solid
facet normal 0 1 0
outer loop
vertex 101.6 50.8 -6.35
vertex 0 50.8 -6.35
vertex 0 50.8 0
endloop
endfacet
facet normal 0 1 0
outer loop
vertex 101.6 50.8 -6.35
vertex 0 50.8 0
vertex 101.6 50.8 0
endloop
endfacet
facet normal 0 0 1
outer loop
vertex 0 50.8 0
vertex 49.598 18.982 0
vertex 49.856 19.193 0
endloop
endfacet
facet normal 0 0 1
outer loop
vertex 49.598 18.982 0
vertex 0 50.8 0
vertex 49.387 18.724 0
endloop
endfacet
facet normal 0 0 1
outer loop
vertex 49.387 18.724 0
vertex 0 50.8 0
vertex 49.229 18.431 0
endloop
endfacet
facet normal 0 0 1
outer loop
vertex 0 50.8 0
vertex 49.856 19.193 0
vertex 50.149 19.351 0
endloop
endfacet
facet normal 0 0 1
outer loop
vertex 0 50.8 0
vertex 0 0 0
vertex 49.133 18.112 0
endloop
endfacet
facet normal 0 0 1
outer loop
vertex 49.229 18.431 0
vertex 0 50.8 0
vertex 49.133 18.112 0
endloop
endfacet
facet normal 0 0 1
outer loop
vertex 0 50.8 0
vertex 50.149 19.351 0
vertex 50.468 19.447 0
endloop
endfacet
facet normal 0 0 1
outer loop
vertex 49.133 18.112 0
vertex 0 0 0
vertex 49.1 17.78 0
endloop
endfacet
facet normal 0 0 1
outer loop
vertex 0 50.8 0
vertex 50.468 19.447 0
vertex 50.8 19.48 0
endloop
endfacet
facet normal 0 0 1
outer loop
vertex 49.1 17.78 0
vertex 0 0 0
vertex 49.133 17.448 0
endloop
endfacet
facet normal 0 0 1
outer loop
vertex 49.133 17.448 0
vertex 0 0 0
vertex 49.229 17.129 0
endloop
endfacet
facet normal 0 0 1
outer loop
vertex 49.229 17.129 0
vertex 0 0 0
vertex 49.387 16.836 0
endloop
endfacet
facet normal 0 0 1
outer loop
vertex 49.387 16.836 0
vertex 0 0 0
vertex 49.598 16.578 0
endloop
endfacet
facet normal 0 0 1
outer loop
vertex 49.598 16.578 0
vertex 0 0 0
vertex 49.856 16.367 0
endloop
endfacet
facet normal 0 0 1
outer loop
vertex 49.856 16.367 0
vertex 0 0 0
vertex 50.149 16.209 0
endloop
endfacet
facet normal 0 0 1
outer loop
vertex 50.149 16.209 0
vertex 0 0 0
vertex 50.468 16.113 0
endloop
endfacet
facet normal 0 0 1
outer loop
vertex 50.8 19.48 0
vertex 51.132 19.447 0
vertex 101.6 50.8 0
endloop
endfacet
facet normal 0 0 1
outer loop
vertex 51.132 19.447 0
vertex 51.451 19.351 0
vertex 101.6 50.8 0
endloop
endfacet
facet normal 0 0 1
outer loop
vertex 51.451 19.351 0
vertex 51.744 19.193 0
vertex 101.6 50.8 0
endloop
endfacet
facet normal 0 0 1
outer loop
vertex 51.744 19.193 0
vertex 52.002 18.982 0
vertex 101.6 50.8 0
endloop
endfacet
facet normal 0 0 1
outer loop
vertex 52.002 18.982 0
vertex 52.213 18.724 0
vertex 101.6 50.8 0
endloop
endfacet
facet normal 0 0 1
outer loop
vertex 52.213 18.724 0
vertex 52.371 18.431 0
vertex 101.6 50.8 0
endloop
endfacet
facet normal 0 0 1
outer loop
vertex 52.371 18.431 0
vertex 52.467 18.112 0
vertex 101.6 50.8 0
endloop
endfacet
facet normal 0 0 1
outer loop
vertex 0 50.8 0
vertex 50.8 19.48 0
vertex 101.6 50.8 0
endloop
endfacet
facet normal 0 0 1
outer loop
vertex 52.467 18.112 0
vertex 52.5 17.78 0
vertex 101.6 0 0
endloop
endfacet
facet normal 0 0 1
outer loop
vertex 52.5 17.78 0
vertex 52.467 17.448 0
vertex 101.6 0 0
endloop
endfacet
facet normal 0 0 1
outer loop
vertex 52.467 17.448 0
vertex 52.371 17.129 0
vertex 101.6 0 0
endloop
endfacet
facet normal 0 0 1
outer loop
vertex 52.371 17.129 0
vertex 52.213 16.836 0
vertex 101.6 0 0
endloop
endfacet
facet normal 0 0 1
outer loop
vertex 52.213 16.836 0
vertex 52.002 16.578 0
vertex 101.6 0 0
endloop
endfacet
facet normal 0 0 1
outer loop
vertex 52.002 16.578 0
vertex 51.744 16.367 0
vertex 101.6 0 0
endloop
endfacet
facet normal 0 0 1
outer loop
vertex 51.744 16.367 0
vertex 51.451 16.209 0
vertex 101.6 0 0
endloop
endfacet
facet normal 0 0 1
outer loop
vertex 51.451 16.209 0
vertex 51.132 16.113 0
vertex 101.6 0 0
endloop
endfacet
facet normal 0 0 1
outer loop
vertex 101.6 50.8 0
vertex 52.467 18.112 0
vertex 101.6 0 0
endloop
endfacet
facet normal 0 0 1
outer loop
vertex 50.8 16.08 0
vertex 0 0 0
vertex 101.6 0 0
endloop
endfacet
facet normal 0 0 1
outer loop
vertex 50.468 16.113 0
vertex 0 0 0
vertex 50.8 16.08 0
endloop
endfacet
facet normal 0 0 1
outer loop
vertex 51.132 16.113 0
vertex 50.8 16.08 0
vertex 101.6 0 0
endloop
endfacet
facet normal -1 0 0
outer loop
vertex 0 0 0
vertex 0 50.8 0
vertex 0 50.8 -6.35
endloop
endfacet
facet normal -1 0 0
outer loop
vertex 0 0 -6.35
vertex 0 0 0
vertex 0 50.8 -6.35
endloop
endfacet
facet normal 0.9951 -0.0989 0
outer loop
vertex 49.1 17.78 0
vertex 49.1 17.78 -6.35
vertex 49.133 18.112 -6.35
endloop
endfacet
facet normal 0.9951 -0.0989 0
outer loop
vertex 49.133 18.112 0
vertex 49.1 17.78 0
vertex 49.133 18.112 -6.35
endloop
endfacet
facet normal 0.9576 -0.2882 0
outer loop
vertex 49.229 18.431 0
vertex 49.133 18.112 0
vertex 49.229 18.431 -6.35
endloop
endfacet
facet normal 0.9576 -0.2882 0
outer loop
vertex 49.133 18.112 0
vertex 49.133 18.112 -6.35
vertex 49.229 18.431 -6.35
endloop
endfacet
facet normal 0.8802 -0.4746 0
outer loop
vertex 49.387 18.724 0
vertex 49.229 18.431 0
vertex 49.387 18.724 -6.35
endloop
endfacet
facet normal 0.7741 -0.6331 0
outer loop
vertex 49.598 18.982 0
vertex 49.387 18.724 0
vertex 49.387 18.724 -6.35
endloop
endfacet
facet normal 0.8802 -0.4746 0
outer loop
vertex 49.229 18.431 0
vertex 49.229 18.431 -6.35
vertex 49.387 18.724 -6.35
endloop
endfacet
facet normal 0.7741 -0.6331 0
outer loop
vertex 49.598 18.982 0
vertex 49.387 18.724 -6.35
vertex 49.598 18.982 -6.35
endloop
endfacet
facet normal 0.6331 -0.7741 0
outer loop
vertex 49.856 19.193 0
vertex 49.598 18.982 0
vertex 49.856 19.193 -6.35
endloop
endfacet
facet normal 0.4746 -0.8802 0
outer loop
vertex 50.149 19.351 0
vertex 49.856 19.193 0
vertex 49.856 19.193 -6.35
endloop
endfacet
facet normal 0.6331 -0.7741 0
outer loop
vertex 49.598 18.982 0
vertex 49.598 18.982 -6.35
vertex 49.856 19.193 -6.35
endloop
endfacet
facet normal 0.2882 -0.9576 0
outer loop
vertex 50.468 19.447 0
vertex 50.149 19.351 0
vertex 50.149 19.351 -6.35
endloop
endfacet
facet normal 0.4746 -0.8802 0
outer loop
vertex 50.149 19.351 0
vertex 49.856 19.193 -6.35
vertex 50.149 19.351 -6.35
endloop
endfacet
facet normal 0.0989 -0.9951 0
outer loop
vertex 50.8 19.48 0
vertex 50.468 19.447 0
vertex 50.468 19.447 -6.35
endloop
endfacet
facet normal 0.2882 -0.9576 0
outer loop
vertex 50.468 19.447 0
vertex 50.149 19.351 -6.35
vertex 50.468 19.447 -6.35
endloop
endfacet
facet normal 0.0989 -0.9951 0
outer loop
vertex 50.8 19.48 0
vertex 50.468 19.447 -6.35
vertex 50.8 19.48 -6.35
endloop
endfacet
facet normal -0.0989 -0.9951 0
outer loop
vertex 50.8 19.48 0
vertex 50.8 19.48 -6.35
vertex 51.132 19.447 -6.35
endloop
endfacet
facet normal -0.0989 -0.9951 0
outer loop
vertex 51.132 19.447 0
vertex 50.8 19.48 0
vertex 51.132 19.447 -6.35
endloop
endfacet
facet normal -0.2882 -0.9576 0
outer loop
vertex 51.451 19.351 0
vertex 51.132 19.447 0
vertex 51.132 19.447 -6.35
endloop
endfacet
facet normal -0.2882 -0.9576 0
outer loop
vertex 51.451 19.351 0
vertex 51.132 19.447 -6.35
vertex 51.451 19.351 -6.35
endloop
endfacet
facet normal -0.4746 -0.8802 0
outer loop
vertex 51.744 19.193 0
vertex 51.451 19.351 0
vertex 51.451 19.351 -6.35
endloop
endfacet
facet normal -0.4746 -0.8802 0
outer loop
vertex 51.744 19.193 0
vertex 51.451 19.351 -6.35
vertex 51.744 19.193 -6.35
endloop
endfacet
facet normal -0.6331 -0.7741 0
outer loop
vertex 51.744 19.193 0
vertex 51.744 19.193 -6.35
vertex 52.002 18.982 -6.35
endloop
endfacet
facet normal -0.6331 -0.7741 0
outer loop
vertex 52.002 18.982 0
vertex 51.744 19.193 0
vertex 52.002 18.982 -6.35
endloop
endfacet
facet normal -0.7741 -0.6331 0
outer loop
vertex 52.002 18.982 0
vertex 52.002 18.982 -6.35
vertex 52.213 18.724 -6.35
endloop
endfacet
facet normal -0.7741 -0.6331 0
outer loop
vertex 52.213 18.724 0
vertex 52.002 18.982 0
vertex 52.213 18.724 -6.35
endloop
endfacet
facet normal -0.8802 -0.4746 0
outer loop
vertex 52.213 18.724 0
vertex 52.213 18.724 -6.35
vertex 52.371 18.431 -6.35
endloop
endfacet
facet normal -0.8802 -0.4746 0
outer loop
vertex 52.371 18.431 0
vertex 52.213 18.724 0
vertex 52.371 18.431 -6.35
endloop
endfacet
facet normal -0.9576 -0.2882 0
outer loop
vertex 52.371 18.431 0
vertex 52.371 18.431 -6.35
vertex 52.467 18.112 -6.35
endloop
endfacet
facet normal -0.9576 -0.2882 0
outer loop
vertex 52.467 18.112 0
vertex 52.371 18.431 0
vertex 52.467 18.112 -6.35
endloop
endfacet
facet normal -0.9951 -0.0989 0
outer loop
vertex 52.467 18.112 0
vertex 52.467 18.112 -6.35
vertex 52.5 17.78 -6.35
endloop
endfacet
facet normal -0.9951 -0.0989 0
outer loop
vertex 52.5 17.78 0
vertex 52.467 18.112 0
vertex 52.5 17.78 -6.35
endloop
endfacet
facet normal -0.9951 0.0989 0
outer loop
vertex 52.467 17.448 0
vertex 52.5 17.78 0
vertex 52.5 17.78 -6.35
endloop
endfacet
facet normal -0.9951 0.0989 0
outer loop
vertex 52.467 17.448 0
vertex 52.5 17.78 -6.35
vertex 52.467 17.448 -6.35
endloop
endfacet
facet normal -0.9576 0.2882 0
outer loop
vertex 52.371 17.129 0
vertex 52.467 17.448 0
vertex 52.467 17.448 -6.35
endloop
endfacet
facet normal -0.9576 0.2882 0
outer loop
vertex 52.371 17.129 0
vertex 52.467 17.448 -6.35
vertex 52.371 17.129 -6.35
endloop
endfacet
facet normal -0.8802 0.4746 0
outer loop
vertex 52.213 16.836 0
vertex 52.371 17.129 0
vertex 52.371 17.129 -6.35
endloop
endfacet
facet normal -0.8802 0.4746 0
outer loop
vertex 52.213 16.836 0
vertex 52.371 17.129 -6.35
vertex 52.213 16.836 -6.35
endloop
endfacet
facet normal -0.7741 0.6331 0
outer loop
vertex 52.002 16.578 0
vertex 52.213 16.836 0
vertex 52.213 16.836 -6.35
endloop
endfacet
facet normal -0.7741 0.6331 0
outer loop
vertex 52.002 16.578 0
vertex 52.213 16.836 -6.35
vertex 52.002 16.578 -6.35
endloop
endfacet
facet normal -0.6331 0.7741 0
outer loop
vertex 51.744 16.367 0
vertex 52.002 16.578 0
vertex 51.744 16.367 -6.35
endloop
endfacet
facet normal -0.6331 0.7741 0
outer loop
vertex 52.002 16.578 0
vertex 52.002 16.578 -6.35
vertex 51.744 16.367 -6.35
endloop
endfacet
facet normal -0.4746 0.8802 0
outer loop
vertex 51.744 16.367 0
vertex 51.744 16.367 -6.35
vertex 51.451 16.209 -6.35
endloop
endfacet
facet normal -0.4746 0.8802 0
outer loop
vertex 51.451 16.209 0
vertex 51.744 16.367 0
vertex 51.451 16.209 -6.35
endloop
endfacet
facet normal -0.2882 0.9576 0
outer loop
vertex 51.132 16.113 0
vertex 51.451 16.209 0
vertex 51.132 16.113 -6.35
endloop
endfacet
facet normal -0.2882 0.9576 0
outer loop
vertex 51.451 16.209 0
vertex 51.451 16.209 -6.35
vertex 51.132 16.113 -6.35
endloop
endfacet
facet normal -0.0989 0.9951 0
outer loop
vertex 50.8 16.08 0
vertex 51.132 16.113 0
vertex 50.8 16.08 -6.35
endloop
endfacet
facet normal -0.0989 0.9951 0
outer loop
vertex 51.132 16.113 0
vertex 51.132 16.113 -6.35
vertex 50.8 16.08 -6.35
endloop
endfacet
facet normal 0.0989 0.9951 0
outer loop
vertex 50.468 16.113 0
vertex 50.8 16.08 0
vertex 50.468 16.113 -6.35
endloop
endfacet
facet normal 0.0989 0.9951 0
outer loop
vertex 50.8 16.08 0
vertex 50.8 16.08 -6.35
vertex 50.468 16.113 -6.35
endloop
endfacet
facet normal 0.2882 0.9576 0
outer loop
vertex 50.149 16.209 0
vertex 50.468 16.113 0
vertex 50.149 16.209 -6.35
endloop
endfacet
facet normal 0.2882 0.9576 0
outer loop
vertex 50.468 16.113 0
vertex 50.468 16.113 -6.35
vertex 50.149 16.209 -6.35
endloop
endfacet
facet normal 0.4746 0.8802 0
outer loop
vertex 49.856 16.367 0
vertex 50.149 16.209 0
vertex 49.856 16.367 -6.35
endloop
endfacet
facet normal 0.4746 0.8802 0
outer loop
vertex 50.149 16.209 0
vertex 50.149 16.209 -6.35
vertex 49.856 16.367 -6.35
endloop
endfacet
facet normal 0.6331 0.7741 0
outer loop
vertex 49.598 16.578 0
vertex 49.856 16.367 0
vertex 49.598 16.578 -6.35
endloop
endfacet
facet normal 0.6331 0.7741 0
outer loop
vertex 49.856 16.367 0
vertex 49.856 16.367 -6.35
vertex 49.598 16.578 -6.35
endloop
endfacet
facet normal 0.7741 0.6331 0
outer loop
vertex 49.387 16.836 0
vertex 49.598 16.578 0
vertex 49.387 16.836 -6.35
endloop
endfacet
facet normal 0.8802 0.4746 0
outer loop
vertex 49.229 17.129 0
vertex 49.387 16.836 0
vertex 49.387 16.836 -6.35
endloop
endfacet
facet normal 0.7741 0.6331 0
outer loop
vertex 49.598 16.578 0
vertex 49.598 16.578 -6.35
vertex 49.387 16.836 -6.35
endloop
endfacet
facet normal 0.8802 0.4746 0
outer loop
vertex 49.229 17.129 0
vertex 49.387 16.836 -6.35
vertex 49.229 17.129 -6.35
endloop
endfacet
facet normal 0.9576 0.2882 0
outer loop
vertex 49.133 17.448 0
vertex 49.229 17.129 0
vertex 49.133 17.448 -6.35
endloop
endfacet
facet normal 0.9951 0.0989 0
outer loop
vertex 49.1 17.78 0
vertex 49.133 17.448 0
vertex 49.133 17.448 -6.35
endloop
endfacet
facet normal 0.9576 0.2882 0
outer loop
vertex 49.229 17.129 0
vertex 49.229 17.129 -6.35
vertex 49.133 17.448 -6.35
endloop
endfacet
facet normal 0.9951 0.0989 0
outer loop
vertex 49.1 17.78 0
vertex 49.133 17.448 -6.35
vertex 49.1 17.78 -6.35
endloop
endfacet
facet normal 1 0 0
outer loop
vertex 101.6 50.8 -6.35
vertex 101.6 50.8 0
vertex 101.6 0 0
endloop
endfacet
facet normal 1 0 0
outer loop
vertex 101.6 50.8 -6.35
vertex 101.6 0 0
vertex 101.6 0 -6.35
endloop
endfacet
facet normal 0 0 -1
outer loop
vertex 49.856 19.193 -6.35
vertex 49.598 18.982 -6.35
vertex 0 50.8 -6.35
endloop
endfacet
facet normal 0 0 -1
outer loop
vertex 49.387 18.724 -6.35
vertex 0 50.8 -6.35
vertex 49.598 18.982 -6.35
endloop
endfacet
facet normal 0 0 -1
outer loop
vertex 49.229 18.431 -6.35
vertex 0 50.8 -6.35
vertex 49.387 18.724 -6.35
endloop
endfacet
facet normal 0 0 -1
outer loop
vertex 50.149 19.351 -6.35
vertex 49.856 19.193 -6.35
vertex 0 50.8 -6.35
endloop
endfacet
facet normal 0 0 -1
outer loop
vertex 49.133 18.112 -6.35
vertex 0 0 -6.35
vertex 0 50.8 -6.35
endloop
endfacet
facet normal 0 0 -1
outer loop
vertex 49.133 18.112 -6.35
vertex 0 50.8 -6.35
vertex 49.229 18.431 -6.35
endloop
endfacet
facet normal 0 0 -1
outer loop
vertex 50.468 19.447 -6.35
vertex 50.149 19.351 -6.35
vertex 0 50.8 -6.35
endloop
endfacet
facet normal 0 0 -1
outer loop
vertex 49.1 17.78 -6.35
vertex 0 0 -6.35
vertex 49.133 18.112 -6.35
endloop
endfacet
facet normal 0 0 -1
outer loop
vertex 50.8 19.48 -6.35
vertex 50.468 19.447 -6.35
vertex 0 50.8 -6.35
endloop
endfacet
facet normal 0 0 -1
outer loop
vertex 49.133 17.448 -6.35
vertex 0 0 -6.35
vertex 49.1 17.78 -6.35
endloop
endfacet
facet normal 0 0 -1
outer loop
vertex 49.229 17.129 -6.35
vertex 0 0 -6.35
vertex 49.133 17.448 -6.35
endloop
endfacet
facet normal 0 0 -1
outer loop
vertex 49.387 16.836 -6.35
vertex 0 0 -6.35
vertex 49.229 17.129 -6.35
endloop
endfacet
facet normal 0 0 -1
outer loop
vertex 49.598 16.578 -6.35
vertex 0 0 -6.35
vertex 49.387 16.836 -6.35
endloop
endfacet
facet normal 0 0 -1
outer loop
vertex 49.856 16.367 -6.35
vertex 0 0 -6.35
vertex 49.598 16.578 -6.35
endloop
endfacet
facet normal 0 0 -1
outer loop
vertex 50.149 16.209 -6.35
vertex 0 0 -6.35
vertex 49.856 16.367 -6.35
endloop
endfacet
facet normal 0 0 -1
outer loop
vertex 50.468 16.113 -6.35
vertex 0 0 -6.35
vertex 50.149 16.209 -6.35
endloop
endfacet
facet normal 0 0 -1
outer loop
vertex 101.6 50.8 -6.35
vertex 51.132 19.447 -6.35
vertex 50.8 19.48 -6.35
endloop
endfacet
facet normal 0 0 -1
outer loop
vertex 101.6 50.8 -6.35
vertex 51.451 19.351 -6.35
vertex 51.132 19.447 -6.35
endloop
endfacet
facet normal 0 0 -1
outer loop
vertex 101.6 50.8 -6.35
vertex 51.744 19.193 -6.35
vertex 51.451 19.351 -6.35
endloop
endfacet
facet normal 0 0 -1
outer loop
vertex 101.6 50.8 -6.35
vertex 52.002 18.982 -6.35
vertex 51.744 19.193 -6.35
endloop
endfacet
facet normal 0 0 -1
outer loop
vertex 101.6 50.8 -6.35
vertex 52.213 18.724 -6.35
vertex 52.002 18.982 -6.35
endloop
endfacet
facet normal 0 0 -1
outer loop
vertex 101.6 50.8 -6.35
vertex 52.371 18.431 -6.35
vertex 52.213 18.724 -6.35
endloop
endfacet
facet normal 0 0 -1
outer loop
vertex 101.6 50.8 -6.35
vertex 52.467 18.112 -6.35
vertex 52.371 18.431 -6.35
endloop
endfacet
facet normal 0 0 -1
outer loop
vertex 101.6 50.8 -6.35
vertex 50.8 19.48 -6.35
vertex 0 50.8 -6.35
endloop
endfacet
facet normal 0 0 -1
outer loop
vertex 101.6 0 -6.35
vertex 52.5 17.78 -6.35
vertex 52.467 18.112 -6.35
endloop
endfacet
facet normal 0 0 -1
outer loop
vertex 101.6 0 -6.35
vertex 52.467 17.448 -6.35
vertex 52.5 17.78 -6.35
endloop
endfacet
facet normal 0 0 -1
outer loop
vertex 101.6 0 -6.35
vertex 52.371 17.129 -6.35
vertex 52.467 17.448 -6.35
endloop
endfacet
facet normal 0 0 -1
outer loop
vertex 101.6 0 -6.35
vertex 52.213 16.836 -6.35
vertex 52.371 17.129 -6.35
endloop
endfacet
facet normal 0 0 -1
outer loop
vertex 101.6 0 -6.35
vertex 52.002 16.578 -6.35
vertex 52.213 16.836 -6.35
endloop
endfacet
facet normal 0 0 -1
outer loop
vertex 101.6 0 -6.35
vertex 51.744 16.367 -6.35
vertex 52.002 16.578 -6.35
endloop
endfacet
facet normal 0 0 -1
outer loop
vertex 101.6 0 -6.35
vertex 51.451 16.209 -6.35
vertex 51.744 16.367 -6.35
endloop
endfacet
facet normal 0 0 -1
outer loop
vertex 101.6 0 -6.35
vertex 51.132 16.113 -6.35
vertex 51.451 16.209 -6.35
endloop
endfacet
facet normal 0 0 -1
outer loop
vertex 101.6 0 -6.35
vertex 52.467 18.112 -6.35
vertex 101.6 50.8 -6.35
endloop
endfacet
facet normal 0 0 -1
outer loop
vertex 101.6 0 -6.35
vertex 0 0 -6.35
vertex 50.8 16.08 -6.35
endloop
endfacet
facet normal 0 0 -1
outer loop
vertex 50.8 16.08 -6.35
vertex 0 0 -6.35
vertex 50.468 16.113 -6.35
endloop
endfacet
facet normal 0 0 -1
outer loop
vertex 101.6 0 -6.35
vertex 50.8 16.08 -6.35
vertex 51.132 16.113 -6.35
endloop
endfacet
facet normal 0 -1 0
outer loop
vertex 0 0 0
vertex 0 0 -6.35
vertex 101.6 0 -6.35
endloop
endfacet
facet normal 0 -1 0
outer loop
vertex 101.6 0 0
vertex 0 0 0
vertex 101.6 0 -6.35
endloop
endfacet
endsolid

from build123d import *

# Parameters (mm, degrees)
SKETCH2_W            = 101.6
SKETCH2_H            = 6.35
BOSS_EXTRUDE1_DEPTH  = 50.8
M3_CLEARANCE_HOLE1_D = 3.4


with BuildPart() as part:
    # Sketch2 → Boss-Extrude1 (new body)
    with BuildSketch(Plane(origin=(0, 0, 0), x_dir=(1, 0, 0), z_dir=(0, 1, 0))):
        with Locations((50.8, 3.175)):
            Rectangle(SKETCH2_W, SKETCH2_H)
    extrude(amount=BOSS_EXTRUDE1_DEPTH)

    # M3 Clearance Hole1 (through all)
    with Locations(Plane.XY):
        with Locations((50.8, 17.78)):
            Hole(M3_CLEARANCE_HOLE1_D / 2)


solid = part.part
